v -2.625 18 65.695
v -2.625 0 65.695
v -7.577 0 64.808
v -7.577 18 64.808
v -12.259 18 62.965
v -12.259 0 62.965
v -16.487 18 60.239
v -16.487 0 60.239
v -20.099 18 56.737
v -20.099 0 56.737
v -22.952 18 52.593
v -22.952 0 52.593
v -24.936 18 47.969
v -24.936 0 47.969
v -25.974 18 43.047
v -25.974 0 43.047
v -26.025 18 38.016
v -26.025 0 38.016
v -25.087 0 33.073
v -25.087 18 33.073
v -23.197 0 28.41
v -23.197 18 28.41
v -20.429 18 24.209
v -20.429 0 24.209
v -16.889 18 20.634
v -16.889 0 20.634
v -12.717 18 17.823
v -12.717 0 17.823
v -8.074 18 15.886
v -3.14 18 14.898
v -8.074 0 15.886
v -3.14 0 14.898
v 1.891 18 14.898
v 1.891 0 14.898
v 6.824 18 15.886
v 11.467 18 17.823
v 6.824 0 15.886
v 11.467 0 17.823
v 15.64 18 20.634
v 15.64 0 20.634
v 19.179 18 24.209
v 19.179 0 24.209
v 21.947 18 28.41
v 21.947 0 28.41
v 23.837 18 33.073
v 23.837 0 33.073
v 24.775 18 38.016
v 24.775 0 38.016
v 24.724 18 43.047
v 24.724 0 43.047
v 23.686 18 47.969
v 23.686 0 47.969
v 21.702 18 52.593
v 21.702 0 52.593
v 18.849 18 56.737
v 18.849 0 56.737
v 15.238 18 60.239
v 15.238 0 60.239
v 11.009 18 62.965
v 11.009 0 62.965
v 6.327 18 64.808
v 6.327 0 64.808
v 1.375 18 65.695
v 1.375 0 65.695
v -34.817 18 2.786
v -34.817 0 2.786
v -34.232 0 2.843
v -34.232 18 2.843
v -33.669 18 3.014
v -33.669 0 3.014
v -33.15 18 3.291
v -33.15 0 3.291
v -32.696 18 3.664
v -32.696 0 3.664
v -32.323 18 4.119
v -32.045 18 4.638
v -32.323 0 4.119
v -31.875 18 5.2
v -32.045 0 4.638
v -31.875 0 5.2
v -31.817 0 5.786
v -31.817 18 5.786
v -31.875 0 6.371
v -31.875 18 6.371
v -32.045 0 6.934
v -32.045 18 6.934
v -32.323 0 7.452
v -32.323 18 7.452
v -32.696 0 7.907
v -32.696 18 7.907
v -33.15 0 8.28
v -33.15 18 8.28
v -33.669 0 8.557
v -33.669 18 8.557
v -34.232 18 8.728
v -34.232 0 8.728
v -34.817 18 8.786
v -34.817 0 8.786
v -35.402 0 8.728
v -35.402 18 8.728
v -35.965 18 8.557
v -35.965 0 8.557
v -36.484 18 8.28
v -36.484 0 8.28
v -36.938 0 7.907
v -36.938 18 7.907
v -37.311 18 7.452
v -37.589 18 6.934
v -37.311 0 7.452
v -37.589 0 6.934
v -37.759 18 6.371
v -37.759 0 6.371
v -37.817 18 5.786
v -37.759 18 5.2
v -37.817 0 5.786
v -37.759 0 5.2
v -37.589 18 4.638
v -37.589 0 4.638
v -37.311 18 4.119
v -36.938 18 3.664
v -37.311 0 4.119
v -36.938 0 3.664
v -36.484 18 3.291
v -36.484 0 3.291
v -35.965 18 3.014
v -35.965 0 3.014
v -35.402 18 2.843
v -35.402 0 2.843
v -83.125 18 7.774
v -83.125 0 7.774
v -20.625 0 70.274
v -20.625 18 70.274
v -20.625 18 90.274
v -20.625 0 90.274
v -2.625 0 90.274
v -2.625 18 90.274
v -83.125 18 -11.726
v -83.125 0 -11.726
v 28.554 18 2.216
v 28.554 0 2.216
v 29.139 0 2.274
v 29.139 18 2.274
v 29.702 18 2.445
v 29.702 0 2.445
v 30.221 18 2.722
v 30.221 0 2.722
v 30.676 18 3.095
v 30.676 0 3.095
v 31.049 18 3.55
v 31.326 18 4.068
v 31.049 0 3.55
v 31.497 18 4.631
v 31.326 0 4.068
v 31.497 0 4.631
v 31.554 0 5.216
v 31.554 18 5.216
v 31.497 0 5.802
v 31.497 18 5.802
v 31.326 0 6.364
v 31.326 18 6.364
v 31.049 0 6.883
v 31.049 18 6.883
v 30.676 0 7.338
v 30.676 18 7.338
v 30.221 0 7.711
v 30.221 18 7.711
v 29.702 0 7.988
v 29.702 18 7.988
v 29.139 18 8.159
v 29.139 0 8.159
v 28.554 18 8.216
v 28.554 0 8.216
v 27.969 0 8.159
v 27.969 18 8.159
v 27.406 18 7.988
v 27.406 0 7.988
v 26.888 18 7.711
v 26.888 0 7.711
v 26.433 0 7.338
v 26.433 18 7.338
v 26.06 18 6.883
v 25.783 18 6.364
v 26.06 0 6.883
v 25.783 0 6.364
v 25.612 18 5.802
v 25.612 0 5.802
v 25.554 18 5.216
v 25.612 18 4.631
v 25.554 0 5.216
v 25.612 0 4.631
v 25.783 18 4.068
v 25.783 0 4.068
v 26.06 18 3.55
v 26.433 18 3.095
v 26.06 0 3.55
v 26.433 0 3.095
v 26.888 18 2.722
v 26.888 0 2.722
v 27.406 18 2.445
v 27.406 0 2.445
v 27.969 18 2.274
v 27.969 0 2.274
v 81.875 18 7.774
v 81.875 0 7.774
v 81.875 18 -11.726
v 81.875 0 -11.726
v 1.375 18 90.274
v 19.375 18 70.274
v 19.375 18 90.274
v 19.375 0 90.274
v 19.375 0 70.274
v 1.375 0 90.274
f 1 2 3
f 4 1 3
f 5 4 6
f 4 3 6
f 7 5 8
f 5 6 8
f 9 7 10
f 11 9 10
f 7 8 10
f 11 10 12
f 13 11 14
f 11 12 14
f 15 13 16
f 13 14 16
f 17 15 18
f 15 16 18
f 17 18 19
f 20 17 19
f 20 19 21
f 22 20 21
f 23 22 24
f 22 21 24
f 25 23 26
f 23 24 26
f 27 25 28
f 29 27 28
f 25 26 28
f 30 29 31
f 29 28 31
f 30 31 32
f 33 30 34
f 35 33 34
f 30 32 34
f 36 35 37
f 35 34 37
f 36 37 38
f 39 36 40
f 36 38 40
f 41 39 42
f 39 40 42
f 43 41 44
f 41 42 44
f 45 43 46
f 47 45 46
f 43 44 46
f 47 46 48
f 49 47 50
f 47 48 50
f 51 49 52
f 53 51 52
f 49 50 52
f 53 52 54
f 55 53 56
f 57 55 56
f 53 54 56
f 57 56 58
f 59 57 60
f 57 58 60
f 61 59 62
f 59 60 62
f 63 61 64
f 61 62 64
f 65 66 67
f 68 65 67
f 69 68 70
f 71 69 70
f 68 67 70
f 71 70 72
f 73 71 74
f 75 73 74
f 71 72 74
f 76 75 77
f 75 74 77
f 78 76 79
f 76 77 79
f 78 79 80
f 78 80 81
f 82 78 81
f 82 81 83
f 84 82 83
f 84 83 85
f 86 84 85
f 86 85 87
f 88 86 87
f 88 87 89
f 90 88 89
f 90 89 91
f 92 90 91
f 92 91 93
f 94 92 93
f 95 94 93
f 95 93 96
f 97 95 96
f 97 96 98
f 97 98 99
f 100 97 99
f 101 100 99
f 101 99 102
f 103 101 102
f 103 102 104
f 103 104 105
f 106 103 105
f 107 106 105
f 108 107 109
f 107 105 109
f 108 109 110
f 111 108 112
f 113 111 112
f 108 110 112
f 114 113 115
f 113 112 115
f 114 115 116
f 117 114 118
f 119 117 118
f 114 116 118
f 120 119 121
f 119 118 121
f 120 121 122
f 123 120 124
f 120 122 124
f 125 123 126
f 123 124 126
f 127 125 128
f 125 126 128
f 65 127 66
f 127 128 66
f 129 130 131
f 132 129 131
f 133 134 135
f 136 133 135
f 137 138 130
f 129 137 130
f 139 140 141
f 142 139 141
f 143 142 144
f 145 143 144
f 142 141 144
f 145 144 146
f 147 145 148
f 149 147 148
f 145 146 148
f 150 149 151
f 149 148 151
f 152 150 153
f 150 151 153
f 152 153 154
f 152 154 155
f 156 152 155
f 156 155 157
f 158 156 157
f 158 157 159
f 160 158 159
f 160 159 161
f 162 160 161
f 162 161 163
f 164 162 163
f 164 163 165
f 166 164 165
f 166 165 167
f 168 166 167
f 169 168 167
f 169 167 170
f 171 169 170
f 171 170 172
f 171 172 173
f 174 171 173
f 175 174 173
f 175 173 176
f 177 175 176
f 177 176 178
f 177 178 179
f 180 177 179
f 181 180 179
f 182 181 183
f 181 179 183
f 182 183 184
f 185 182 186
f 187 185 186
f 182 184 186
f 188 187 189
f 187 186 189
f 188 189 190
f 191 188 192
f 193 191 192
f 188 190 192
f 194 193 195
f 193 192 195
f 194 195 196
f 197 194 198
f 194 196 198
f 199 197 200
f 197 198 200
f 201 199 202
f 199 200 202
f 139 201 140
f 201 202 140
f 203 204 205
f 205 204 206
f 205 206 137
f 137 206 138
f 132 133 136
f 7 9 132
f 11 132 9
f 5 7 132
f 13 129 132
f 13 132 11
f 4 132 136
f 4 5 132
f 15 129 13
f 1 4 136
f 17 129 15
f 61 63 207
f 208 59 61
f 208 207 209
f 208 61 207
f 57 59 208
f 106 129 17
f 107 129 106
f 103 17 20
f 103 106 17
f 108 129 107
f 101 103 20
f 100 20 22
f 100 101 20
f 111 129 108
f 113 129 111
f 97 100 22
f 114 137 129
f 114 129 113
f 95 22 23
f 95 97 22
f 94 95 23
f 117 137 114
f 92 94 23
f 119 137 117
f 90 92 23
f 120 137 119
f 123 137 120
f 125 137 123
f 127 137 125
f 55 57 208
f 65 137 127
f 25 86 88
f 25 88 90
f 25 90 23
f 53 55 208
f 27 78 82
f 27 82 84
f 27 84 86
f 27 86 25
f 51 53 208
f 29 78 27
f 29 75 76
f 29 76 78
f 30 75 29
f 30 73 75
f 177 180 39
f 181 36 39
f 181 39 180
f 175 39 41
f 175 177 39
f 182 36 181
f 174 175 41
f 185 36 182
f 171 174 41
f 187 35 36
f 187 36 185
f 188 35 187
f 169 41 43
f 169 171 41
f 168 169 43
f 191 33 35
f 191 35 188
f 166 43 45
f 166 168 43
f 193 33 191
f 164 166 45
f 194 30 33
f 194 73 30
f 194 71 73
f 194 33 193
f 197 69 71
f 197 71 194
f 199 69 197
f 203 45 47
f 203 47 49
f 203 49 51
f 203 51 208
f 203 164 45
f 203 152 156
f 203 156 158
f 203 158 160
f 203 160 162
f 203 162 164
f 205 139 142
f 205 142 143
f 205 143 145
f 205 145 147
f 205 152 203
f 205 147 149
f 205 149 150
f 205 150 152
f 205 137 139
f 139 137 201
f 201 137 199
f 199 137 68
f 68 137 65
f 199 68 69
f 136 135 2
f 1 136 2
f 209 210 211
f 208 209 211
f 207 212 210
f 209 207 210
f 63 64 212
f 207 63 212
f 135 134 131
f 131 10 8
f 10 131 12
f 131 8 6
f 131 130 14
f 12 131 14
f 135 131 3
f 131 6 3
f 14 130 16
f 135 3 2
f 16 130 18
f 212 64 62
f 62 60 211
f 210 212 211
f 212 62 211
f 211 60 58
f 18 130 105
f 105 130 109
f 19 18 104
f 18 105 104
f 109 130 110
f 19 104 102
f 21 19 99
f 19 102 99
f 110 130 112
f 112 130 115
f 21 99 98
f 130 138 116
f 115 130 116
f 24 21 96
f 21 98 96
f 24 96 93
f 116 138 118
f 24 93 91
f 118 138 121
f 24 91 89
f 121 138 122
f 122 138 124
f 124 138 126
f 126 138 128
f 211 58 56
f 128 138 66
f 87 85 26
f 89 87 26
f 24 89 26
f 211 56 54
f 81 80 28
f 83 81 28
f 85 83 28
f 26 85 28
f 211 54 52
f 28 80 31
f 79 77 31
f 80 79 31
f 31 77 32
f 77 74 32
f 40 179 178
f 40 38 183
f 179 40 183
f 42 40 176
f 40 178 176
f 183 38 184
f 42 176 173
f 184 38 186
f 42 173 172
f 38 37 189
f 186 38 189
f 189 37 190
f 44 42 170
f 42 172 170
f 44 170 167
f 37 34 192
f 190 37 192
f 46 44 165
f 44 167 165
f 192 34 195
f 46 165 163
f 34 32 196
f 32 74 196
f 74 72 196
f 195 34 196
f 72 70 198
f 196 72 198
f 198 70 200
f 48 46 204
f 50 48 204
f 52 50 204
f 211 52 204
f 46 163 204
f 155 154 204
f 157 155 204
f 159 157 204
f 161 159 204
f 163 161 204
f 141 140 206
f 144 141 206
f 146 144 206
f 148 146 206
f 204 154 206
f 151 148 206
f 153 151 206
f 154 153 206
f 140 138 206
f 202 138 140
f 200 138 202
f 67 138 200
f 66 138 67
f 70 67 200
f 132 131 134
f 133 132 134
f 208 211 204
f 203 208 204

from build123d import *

# Parameters (mm, degrees)
EXTRUDE1_DEPTH           = 18
F_6_0_6_DIAMETER_HOLE1_D = 6


with BuildPart() as part:
    # Sketch1 → Extrude1 (new body)
    with BuildSketch(Plane(origin=(0, 0, 0), x_dir=(1, 0, 0), z_dir=(0, 1, 0))):
        with BuildLine():
            Line((-83.124824855, -7.773679355), (-20.624824855, -70.273679355))
            Line((-20.624824855, -70.273679355), (-20.624824855, -90.273679355))
            Line((-20.624824855, -90.273679355), (-2.624824855, -90.273679355))
            Line((-2.624824855, -90.273679355), (-2.624824855, -65.695126993))
            ThreePointArc((-2.624824855, -65.695126993), (-0.624824855, -14.773679355), (1.375175145, -65.695126993))
            Line((1.375175145, -65.695126993), (1.375175145, -90.273679355))
            Line((1.375175145, -90.273679355), (19.375175145, -90.273679355))
            Line((19.375175145, -90.273679355), (19.375175145, -70.273679355))
            Line((19.375175145, -70.273679355), (81.875175145, -7.773679355))
            Line((81.875175145, -7.773679355), (81.875175145, 11.726320645))
            Line((81.875175145, 11.726320645), (-83.124824855, 11.726320645))
            Line((-83.124824855, 11.726320645), (-83.124824855, -7.773679355))
        make_face()
    extrude(amount=EXTRUDE1_DEPTH)

    # Ø6.0 (6) Diameter Hole1 (through all)
    with Locations(Plane(origin=(-34.816928484, 18, 5.785627569), x_dir=(0, 0, 1), z_dir=(0, 1, 0))):
        with Locations((0, 0), (-0.569202013, 63.371157488)):
            Hole(F_6_0_6_DIAMETER_HOLE1_D / 2)


solid = part.part
